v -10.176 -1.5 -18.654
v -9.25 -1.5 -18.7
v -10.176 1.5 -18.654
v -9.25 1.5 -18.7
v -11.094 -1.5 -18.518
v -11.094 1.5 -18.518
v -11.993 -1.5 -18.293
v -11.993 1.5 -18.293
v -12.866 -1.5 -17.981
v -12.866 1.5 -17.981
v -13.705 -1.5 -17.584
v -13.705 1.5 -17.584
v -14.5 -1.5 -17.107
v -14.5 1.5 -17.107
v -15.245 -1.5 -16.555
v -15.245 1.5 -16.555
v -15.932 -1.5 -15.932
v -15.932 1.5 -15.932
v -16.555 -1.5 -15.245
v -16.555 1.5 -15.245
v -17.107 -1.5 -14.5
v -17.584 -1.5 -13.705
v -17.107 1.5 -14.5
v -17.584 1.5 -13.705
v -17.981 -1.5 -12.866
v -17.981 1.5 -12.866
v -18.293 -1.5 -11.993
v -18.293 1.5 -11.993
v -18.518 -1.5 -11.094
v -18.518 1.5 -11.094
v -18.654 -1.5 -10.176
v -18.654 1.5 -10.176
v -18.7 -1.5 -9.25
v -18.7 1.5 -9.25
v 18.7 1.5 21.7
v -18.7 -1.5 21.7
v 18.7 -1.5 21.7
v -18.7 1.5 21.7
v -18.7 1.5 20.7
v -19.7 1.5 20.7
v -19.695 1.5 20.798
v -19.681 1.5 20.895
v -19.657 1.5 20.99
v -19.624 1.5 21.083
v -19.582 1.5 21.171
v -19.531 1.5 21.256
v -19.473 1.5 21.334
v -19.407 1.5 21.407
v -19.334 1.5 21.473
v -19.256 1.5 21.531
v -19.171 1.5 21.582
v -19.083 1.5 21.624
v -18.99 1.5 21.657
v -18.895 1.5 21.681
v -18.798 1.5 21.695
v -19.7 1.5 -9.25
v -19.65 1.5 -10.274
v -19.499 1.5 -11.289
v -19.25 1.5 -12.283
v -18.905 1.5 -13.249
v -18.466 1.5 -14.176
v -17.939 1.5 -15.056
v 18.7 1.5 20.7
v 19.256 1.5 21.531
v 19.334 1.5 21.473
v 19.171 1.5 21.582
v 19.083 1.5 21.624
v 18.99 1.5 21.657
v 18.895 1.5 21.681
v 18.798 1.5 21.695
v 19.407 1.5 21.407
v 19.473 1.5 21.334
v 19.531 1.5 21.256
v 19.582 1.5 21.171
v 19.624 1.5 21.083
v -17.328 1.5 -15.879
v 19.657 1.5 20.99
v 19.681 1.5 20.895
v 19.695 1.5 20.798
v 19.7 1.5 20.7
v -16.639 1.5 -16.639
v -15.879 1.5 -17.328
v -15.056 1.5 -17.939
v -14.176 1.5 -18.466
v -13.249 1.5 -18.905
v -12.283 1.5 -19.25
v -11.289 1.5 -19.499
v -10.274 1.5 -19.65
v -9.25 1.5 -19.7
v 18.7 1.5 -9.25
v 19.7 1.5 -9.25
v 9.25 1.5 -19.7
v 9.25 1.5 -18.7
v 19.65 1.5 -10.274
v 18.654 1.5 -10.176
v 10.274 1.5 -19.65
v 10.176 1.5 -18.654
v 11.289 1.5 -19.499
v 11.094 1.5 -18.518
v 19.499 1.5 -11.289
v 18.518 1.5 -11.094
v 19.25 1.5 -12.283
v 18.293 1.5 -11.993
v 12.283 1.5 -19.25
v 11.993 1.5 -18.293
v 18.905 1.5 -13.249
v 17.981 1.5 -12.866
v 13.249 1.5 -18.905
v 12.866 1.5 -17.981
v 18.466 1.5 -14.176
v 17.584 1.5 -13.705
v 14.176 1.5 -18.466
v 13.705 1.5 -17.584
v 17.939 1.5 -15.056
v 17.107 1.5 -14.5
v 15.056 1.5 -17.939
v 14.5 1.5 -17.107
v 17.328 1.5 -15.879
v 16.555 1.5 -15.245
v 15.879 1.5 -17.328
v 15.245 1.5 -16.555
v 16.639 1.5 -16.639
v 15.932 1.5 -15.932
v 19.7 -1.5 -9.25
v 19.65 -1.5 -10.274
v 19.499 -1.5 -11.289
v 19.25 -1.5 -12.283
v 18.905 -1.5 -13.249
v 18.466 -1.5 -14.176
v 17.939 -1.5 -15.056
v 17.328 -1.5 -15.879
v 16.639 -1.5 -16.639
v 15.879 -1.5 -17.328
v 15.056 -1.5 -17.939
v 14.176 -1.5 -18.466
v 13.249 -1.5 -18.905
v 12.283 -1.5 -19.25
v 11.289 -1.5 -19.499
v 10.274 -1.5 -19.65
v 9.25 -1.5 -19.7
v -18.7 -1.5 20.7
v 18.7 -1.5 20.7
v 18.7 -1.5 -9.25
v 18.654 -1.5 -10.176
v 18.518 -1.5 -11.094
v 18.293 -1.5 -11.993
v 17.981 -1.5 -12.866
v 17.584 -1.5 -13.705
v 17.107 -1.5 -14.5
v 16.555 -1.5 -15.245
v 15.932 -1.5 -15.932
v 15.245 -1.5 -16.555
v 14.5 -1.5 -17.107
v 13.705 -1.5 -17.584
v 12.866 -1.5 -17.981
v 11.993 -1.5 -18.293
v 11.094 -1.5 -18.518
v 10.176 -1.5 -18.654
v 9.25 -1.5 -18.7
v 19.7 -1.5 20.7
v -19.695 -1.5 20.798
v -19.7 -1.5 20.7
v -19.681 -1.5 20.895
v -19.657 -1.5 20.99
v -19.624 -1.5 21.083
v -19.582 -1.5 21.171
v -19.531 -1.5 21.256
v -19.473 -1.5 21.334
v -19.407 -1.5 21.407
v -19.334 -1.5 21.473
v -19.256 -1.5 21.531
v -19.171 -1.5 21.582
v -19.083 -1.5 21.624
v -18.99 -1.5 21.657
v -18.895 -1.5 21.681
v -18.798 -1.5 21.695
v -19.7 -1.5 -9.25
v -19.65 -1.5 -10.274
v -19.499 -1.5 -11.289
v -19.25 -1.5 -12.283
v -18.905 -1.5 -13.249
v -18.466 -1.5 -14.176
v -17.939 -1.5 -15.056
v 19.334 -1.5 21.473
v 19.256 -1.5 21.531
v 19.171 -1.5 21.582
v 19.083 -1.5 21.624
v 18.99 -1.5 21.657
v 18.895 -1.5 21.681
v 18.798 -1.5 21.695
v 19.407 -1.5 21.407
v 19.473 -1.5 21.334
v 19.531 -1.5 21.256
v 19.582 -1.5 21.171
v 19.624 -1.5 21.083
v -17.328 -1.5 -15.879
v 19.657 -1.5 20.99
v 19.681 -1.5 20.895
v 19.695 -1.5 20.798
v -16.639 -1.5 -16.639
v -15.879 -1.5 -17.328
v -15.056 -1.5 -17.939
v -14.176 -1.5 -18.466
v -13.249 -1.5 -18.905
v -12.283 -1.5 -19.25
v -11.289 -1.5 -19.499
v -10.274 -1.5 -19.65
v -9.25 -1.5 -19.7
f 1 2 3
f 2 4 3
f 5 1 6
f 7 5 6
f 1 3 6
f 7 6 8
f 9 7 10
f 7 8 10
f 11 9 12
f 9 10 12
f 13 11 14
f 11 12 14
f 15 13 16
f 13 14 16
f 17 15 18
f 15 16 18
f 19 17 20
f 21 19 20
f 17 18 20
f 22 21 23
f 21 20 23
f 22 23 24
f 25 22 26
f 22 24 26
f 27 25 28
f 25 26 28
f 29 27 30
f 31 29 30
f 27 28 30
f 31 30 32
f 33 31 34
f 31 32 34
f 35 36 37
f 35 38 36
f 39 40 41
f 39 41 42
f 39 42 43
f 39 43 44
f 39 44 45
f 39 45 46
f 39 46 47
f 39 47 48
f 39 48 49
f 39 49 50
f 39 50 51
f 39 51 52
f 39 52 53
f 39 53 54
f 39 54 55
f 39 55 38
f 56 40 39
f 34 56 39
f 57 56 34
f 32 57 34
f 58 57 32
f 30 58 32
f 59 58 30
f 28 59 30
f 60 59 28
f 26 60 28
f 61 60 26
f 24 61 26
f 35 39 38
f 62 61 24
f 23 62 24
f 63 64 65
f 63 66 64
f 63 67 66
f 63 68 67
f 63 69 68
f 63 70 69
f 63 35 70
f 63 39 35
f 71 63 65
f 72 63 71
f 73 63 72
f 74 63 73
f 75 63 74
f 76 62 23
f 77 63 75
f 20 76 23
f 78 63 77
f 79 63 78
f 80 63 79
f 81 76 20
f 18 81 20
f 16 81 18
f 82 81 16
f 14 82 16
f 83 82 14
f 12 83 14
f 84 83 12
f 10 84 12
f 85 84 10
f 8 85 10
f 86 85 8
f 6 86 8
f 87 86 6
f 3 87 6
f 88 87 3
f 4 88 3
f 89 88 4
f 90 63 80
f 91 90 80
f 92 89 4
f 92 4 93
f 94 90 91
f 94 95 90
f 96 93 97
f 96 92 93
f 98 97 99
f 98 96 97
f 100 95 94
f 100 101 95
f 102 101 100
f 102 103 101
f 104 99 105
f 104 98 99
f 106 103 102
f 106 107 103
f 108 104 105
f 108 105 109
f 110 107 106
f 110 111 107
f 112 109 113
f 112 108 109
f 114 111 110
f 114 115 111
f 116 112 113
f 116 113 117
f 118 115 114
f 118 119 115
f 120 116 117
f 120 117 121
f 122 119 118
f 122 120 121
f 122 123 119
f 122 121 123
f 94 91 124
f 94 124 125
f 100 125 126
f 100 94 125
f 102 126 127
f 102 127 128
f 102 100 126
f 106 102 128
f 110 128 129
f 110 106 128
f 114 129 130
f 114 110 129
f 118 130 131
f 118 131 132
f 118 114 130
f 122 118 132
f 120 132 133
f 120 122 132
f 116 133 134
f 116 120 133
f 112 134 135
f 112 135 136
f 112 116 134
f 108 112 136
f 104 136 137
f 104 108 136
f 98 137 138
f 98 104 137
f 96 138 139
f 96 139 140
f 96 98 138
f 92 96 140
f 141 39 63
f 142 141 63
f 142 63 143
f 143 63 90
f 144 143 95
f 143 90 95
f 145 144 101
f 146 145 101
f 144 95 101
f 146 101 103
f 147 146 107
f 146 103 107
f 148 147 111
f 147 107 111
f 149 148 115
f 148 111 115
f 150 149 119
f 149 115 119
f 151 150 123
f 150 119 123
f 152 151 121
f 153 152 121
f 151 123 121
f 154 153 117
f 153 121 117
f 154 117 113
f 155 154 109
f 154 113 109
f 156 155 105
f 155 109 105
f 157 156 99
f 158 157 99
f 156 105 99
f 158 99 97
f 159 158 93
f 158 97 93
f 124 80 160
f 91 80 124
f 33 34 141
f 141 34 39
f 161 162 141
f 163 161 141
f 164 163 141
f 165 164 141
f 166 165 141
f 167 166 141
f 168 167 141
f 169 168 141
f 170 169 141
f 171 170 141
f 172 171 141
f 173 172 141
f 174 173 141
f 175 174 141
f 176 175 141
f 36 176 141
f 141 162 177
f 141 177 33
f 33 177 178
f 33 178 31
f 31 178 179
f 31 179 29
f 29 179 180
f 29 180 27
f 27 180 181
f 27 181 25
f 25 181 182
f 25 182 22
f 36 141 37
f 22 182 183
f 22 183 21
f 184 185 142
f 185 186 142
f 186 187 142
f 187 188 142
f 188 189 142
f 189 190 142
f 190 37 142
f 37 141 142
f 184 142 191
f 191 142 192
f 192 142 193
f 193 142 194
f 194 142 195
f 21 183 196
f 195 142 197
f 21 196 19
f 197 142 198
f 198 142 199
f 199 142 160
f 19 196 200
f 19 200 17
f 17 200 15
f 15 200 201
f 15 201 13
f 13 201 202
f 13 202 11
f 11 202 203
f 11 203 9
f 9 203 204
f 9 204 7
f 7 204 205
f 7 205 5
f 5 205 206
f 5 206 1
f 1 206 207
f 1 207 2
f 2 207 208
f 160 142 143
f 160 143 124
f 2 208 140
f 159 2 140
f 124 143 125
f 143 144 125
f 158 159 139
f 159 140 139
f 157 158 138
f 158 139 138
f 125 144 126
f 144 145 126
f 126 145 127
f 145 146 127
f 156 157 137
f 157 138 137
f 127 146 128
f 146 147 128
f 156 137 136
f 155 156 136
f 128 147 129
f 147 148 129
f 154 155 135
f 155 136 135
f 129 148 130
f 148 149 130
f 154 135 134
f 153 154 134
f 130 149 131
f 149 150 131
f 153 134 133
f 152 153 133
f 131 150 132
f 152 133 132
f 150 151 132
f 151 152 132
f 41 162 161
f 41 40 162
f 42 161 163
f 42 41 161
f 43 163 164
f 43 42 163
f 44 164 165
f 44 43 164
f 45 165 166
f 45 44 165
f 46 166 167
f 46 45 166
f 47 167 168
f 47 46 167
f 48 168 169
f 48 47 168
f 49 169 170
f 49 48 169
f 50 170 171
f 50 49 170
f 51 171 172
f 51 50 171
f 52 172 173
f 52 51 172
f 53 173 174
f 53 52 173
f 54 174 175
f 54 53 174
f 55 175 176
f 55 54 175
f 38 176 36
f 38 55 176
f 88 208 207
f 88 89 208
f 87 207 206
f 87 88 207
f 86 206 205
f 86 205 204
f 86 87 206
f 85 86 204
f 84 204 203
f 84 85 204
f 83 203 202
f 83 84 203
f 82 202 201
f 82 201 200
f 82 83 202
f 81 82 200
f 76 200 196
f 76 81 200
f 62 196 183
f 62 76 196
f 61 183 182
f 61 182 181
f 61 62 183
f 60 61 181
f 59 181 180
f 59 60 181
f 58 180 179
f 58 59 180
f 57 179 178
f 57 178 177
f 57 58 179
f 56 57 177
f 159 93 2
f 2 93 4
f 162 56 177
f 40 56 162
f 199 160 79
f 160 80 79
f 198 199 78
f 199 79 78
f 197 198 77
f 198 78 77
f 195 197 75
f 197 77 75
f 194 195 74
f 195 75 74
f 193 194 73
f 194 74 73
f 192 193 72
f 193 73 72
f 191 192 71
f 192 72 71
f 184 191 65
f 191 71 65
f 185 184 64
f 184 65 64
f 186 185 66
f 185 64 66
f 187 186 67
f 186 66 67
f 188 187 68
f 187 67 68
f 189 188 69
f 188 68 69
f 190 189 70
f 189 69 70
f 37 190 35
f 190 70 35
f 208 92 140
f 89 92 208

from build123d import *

# Parameters (mm, degrees)
BOSS_EXTRUDE1_DEPTH = 1.5
FILLET1_R           = 1


with BuildPart() as part:
    # Sketch1 → Boss-Extrude1 (new, symmetric)
    with BuildSketch(Plane(origin=(0, 0, 0), x_dir=(1, 0, 0), z_dir=(0, 1, 0))):
        with BuildLine():
            Line((-19.7, 9.25), (-19.7, -21.7))
            Line((-19.7, -21.7), (19.7, -21.7))
            Line((19.7, -21.7), (19.7, 9.25))
            ThreePointArc((19.7, 9.25), (16.639265863, 16.639265863), (9.25, 19.7))
            Line((9.25, 19.7), (-9.25, 19.7))
            ThreePointArc((-9.25, 19.7), (-16.639265863, 16.639265863), (-19.7, 9.25))
        make_face()
        with BuildLine():
            Line((-18.7, -20.7), (18.7, -20.7))
            Line((18.7, -20.7), (18.7, 9.25))
            ThreePointArc((18.7, 9.25), (15.932159082, 15.932159082), (9.25, 18.7))
            Line((9.25, 18.7), (-9.25, 18.7))
            ThreePointArc((-9.25, 18.7), (-15.932159082, 15.932159082), (-18.7, 9.25))
            Line((-18.7, 9.25), (-18.7, -20.7))
        make_face(mode=Mode.SUBTRACT)
    extrude(amount=BOSS_EXTRUDE1_DEPTH, both=True)

    # Fillet1
    fillet1_edges = [part.edges().sort_by_distance(p)[0] for p in [
        (19.7, 0, 21.7),
        (-19.7, 0, 21.7),
    ]]
    fillet(fillet1_edges, radius=FILLET1_R)


solid = part.part
